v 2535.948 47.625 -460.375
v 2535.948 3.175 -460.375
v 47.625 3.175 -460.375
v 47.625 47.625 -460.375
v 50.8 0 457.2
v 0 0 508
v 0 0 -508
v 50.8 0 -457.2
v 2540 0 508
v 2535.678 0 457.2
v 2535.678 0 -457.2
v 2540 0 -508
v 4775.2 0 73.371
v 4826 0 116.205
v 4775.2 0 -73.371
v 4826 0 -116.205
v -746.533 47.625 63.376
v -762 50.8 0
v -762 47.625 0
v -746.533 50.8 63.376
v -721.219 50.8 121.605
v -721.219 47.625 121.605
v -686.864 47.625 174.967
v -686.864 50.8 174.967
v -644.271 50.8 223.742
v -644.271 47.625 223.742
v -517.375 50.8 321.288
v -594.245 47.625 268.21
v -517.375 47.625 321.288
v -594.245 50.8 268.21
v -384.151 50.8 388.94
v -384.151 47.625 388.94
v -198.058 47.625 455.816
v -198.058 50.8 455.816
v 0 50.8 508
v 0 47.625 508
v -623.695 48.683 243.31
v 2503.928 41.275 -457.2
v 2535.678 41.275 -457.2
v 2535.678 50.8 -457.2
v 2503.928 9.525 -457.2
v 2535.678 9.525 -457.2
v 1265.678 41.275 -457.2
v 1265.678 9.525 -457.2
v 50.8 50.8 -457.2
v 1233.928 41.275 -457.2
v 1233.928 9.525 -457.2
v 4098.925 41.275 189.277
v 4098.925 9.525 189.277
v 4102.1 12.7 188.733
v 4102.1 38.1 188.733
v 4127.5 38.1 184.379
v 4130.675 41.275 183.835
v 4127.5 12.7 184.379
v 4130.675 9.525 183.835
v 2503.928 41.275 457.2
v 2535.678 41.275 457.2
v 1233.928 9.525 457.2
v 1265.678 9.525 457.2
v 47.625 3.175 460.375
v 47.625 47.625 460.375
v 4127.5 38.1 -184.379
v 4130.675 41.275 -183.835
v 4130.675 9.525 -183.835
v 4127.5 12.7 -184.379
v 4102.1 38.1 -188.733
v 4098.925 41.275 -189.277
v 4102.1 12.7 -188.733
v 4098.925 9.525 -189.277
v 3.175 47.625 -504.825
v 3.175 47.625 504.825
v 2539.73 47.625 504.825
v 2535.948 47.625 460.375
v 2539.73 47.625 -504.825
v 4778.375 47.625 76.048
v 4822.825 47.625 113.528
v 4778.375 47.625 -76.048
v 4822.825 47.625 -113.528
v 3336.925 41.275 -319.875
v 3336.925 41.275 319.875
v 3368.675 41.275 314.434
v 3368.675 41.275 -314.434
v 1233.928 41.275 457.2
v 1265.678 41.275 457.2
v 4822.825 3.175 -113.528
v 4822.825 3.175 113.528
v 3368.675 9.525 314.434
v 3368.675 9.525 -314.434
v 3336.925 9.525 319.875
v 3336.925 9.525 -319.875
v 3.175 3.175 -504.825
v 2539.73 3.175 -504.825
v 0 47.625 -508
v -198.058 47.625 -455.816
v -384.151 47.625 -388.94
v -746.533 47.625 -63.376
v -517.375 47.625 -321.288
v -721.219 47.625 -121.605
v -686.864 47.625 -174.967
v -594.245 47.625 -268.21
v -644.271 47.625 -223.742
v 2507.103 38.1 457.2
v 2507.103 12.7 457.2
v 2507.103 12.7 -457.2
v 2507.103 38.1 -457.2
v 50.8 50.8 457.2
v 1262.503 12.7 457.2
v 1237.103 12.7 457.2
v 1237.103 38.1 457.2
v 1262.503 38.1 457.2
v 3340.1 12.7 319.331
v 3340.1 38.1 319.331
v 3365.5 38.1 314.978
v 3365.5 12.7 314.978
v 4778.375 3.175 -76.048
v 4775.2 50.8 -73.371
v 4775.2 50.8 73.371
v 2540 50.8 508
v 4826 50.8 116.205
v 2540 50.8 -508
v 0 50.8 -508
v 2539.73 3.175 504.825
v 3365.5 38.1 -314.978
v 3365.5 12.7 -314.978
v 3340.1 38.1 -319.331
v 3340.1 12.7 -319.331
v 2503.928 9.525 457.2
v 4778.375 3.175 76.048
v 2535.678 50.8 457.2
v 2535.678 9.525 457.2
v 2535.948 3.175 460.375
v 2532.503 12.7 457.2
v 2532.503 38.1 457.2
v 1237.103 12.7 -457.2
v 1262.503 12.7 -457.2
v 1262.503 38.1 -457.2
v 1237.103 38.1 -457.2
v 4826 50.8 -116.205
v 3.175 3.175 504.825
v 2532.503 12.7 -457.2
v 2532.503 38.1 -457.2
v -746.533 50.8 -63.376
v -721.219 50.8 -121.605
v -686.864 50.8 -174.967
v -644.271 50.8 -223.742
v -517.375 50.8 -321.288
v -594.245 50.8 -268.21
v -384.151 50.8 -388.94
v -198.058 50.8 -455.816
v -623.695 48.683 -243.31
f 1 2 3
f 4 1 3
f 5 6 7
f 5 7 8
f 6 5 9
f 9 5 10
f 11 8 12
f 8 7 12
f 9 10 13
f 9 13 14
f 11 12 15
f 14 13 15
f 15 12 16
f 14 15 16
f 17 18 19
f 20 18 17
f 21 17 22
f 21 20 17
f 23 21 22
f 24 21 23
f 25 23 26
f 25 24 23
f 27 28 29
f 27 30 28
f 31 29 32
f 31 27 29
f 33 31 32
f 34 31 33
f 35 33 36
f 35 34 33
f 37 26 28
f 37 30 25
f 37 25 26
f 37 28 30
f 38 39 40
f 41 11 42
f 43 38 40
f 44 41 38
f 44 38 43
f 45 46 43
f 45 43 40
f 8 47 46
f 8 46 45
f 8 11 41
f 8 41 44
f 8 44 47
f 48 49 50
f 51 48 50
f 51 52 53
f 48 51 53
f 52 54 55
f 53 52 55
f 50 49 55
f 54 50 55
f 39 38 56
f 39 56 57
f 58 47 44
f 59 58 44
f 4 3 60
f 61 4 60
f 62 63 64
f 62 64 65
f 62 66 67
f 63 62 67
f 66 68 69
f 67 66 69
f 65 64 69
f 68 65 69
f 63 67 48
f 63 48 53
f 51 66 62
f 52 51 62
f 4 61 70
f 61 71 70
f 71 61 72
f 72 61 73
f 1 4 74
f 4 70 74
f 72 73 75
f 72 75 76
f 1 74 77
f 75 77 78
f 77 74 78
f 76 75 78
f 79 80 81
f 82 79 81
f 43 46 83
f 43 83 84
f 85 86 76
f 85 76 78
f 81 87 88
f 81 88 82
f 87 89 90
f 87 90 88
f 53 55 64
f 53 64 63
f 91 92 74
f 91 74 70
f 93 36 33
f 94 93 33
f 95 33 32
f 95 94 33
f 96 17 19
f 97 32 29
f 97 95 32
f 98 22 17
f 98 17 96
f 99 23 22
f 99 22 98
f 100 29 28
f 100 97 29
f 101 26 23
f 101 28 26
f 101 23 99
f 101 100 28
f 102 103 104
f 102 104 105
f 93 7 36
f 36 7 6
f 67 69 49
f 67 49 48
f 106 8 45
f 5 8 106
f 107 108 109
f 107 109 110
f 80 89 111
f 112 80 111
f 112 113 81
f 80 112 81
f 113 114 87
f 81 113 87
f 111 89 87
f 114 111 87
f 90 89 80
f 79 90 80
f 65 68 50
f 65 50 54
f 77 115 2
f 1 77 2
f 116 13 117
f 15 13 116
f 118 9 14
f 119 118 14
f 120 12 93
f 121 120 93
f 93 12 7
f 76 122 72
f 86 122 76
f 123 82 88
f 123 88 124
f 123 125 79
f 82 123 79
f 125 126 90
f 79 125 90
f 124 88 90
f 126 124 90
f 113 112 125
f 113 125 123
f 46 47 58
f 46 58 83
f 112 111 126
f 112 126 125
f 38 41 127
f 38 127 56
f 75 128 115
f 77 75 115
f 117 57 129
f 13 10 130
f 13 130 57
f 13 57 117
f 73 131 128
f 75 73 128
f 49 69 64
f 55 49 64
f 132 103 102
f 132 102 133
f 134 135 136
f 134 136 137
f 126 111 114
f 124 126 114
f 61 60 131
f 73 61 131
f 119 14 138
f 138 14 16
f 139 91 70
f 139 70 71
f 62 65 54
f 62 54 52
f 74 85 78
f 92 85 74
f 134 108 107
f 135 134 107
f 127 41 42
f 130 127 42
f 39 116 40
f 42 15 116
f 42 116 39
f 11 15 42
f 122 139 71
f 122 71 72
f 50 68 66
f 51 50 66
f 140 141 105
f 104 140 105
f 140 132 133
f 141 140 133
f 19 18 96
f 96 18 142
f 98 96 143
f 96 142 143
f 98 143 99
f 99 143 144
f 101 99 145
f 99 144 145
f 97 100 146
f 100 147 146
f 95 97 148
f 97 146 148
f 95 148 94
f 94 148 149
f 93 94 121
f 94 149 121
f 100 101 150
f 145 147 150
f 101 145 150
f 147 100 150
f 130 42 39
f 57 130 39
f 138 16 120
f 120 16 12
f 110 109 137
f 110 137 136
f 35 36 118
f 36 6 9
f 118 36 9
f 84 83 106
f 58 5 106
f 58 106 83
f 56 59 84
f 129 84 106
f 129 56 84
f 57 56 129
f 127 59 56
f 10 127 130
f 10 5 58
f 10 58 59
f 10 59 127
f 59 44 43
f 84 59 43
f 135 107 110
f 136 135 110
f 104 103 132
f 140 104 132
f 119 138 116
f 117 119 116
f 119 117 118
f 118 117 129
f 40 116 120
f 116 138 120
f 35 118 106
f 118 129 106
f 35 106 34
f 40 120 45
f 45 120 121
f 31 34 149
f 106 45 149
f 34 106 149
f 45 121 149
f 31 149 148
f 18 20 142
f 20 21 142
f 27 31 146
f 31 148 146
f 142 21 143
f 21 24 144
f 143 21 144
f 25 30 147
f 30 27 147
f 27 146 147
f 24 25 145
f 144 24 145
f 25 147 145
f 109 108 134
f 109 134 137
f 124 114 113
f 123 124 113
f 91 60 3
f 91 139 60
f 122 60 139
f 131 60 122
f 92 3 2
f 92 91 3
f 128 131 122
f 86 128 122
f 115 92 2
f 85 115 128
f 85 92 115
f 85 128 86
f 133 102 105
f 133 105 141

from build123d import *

# Parameters (mm, degrees)
BOSS_EXTRUDE1_DEPTH             = 50.8
CUT_EXTRUDE1_DEPTH              = 44.45
BOSS_EXTRUDE2_REACH             = 967.2
SKETCH3_W                       = 31.75
SKETCH3_H                       = 31.75
SKETCH3_W_2                     = 25.4
SKETCH3_H_2                     = 25.4
BOSS_EXTRUDE3_REACH             = 510
SKETCH8_W                       = 31.75
SKETCH8_H                       = 31.75
SKETCH8_W_2                     = 25.4
SKETCH8_H_2                     = 25.4
BOSS_EXTRUDE3_DIRECTION_2_REACH = 510
BOSS_EXTRUDE5_DEPTH             = 3.175


with BuildPart() as part:
    # Sketch1 → Boss-Extrude1 (new body)
    with BuildSketch(Plane(origin=(0, 0, 0), x_dir=(1, 0, 0), z_dir=(0, 1, 0))):
        Polygon((0, 508), (0, -508), (2540, -508), (4826, -116.205), (4826, 116.205), (2540, 508), align=None)
        Polygon((2535.678229605, 457.2), (50.8, 457.2), (50.8, -457.2), (2535.678229605, -457.2), (4775.2, -73.37085213), (4775.2, 73.37085213), align=None, mode=Mode.SUBTRACT)
    extrude(amount=BOSS_EXTRUDE1_DEPTH)

    # Sketch2 → Cut-Extrude1 (cut)
    with BuildSketch(Plane(origin=(0, 3.175, 0), x_dir=(1, 0, 0), z_dir=(0, 1, 0))):
        Polygon((3.175, -504.825), (2539.72988935, -504.825), (4822.825, -113.527865758), (4822.825, 113.527865758), (2539.72988935, 504.825), (3.175, 504.825), align=None)
        Polygon((2535.948340255, 460.375), (47.625, 460.375), (47.625, -460.375), (2535.948340255, -460.375), (4778.375, -76.047986372), (4778.375, 76.047986372), align=None, mode=Mode.SUBTRACT)
    extrude(amount=CUT_EXTRUDE1_DEPTH, mode=Mode.SUBTRACT)

    # Sketch3 → Boss-Extrude2 (add, up to next)
    with BuildSketch(Plane.XY.offset(-457.2), mode=Mode.PRIVATE) as boss_extrude2_sk1:
        with Locations((2519.803229605, 25.4)):
            Rectangle(SKETCH3_W, SKETCH3_H)
        with Locations((2519.803229605, 25.4)):
            Rectangle(SKETCH3_W_2, SKETCH3_H_2, mode=Mode.SUBTRACT)
    boss_extrude2_tool1 = extrude(boss_extrude2_sk1.sketch, amount=BOSS_EXTRUDE2_REACH, mode=Mode.PRIVATE) - part.part
    add(boss_extrude2_tool1.solids().sort_by_distance((2535.229217, 25.4, -457.2))[0])
    # Sketch3 → Boss-Extrude2 (add, up to next)
    with BuildSketch(Plane.XY.offset(-457.2), mode=Mode.PRIVATE) as boss_extrude2_sk2:
        with Locations((1249.803229605, 25.4)):
            Rectangle(SKETCH3_W, SKETCH3_H)
        with Locations((1249.803229605, 25.4)):
            Rectangle(SKETCH3_W_2, SKETCH3_H_2, mode=Mode.SUBTRACT)
    boss_extrude2_tool2 = extrude(boss_extrude2_sk2.sketch, amount=BOSS_EXTRUDE2_REACH, mode=Mode.PRIVATE) - part.part
    add(boss_extrude2_tool2.solids().sort_by_distance((1249.80323, 40.825987, -457.2))[0])


with BuildPart() as body_2:

    # Sketch8 → Boss-Extrude3 (new body, up to next)
    with BuildSketch(Plane.XY, mode=Mode.PRIVATE) as boss_extrude3_sk1:
        with Locations((3352.8, 25.4)):
            Rectangle(SKETCH8_W, SKETCH8_H)
        with Locations((3352.8, 25.4)):
            Rectangle(SKETCH8_W_2, SKETCH8_H_2, mode=Mode.SUBTRACT)
    boss_extrude3_tool1 = extrude(boss_extrude3_sk1.sketch, amount=BOSS_EXTRUDE3_REACH, mode=Mode.PRIVATE) - part.part
    add(boss_extrude3_tool1.solids().sort_by_distance((3352.8, 40.825987, 0))[0])
    # Sketch8 → Boss-Extrude3 (new body, up to next)
    with BuildSketch(Plane.XY, mode=Mode.PRIVATE) as boss_extrude3_sk2:
        with Locations((4114.8, 25.4)):
            Rectangle(SKETCH8_W, SKETCH8_H)
        with Locations((4114.8, 25.4)):
            Rectangle(SKETCH8_W_2, SKETCH8_H_2, mode=Mode.SUBTRACT)
    boss_extrude3_tool2 = extrude(boss_extrude3_sk2.sketch, amount=BOSS_EXTRUDE3_REACH, mode=Mode.PRIVATE) - part.part
    add(boss_extrude3_tool2.solids().sort_by_distance((4114.8, 40.825987, 0))[0])


    # Sketch8 → Boss-Extrude3 direction 2 (add, up to next)
    with BuildSketch(Plane.XY, mode=Mode.PRIVATE) as boss_extrude3_direction_2_sk1:
        with Locations((3352.8, 25.4)):
            Rectangle(SKETCH8_W, SKETCH8_H)
        with Locations((3352.8, 25.4)):
            Rectangle(SKETCH8_W_2, SKETCH8_H_2, mode=Mode.SUBTRACT)
    boss_extrude3_direction_2_tool1 = extrude(boss_extrude3_direction_2_sk1.sketch, amount=-BOSS_EXTRUDE3_DIRECTION_2_REACH, mode=Mode.PRIVATE) - part.part
    add(boss_extrude3_direction_2_tool1.solids().sort_by_distance((3352.8, 40.825987, 0))[0])
    # Sketch8 → Boss-Extrude3 direction 2 (add, up to next)
    with BuildSketch(Plane.XY, mode=Mode.PRIVATE) as boss_extrude3_direction_2_sk2:
        with Locations((4114.8, 25.4)):
            Rectangle(SKETCH8_W, SKETCH8_H)
        with Locations((4114.8, 25.4)):
            Rectangle(SKETCH8_W_2, SKETCH8_H_2, mode=Mode.SUBTRACT)
    boss_extrude3_direction_2_tool2 = extrude(boss_extrude3_direction_2_sk2.sketch, amount=-BOSS_EXTRUDE3_DIRECTION_2_REACH, mode=Mode.PRIVATE) - part.part
    add(boss_extrude3_direction_2_tool2.solids().sort_by_distance((4114.8, 40.825987, 0))[0])


with BuildPart() as part_1:
    add(part.part)

    # Sketch11 → Boss-Extrude5 (add)
    with BuildSketch(Plane(origin=(0, 50.8, 0), x_dir=(1, 0, 0), z_dir=(0, 1, 0))):
        with BuildLine():
            Line((0, 508), (0, -508))
            add(Edge.make_bspline(
                [(-762, 0), (-716.49643682, -292.478097615), (-357.636604654, -425.270631445), (0, -508)],
                knots=[0, 0, 0, 0, 1, 1, 1, 1], degree=3))
            add(Edge.make_bspline(
                [(-762, 0), (-716.49643682, 292.478097615), (-357.636604654, 425.270631445), (0, 508)],
                knots=[0, 0, 0, 0, 1, 1, 1, 1], degree=3))
        make_face()
    extrude(amount=-BOSS_EXTRUDE5_DEPTH)


solid = Compound([body_2.part, part_1.part])
